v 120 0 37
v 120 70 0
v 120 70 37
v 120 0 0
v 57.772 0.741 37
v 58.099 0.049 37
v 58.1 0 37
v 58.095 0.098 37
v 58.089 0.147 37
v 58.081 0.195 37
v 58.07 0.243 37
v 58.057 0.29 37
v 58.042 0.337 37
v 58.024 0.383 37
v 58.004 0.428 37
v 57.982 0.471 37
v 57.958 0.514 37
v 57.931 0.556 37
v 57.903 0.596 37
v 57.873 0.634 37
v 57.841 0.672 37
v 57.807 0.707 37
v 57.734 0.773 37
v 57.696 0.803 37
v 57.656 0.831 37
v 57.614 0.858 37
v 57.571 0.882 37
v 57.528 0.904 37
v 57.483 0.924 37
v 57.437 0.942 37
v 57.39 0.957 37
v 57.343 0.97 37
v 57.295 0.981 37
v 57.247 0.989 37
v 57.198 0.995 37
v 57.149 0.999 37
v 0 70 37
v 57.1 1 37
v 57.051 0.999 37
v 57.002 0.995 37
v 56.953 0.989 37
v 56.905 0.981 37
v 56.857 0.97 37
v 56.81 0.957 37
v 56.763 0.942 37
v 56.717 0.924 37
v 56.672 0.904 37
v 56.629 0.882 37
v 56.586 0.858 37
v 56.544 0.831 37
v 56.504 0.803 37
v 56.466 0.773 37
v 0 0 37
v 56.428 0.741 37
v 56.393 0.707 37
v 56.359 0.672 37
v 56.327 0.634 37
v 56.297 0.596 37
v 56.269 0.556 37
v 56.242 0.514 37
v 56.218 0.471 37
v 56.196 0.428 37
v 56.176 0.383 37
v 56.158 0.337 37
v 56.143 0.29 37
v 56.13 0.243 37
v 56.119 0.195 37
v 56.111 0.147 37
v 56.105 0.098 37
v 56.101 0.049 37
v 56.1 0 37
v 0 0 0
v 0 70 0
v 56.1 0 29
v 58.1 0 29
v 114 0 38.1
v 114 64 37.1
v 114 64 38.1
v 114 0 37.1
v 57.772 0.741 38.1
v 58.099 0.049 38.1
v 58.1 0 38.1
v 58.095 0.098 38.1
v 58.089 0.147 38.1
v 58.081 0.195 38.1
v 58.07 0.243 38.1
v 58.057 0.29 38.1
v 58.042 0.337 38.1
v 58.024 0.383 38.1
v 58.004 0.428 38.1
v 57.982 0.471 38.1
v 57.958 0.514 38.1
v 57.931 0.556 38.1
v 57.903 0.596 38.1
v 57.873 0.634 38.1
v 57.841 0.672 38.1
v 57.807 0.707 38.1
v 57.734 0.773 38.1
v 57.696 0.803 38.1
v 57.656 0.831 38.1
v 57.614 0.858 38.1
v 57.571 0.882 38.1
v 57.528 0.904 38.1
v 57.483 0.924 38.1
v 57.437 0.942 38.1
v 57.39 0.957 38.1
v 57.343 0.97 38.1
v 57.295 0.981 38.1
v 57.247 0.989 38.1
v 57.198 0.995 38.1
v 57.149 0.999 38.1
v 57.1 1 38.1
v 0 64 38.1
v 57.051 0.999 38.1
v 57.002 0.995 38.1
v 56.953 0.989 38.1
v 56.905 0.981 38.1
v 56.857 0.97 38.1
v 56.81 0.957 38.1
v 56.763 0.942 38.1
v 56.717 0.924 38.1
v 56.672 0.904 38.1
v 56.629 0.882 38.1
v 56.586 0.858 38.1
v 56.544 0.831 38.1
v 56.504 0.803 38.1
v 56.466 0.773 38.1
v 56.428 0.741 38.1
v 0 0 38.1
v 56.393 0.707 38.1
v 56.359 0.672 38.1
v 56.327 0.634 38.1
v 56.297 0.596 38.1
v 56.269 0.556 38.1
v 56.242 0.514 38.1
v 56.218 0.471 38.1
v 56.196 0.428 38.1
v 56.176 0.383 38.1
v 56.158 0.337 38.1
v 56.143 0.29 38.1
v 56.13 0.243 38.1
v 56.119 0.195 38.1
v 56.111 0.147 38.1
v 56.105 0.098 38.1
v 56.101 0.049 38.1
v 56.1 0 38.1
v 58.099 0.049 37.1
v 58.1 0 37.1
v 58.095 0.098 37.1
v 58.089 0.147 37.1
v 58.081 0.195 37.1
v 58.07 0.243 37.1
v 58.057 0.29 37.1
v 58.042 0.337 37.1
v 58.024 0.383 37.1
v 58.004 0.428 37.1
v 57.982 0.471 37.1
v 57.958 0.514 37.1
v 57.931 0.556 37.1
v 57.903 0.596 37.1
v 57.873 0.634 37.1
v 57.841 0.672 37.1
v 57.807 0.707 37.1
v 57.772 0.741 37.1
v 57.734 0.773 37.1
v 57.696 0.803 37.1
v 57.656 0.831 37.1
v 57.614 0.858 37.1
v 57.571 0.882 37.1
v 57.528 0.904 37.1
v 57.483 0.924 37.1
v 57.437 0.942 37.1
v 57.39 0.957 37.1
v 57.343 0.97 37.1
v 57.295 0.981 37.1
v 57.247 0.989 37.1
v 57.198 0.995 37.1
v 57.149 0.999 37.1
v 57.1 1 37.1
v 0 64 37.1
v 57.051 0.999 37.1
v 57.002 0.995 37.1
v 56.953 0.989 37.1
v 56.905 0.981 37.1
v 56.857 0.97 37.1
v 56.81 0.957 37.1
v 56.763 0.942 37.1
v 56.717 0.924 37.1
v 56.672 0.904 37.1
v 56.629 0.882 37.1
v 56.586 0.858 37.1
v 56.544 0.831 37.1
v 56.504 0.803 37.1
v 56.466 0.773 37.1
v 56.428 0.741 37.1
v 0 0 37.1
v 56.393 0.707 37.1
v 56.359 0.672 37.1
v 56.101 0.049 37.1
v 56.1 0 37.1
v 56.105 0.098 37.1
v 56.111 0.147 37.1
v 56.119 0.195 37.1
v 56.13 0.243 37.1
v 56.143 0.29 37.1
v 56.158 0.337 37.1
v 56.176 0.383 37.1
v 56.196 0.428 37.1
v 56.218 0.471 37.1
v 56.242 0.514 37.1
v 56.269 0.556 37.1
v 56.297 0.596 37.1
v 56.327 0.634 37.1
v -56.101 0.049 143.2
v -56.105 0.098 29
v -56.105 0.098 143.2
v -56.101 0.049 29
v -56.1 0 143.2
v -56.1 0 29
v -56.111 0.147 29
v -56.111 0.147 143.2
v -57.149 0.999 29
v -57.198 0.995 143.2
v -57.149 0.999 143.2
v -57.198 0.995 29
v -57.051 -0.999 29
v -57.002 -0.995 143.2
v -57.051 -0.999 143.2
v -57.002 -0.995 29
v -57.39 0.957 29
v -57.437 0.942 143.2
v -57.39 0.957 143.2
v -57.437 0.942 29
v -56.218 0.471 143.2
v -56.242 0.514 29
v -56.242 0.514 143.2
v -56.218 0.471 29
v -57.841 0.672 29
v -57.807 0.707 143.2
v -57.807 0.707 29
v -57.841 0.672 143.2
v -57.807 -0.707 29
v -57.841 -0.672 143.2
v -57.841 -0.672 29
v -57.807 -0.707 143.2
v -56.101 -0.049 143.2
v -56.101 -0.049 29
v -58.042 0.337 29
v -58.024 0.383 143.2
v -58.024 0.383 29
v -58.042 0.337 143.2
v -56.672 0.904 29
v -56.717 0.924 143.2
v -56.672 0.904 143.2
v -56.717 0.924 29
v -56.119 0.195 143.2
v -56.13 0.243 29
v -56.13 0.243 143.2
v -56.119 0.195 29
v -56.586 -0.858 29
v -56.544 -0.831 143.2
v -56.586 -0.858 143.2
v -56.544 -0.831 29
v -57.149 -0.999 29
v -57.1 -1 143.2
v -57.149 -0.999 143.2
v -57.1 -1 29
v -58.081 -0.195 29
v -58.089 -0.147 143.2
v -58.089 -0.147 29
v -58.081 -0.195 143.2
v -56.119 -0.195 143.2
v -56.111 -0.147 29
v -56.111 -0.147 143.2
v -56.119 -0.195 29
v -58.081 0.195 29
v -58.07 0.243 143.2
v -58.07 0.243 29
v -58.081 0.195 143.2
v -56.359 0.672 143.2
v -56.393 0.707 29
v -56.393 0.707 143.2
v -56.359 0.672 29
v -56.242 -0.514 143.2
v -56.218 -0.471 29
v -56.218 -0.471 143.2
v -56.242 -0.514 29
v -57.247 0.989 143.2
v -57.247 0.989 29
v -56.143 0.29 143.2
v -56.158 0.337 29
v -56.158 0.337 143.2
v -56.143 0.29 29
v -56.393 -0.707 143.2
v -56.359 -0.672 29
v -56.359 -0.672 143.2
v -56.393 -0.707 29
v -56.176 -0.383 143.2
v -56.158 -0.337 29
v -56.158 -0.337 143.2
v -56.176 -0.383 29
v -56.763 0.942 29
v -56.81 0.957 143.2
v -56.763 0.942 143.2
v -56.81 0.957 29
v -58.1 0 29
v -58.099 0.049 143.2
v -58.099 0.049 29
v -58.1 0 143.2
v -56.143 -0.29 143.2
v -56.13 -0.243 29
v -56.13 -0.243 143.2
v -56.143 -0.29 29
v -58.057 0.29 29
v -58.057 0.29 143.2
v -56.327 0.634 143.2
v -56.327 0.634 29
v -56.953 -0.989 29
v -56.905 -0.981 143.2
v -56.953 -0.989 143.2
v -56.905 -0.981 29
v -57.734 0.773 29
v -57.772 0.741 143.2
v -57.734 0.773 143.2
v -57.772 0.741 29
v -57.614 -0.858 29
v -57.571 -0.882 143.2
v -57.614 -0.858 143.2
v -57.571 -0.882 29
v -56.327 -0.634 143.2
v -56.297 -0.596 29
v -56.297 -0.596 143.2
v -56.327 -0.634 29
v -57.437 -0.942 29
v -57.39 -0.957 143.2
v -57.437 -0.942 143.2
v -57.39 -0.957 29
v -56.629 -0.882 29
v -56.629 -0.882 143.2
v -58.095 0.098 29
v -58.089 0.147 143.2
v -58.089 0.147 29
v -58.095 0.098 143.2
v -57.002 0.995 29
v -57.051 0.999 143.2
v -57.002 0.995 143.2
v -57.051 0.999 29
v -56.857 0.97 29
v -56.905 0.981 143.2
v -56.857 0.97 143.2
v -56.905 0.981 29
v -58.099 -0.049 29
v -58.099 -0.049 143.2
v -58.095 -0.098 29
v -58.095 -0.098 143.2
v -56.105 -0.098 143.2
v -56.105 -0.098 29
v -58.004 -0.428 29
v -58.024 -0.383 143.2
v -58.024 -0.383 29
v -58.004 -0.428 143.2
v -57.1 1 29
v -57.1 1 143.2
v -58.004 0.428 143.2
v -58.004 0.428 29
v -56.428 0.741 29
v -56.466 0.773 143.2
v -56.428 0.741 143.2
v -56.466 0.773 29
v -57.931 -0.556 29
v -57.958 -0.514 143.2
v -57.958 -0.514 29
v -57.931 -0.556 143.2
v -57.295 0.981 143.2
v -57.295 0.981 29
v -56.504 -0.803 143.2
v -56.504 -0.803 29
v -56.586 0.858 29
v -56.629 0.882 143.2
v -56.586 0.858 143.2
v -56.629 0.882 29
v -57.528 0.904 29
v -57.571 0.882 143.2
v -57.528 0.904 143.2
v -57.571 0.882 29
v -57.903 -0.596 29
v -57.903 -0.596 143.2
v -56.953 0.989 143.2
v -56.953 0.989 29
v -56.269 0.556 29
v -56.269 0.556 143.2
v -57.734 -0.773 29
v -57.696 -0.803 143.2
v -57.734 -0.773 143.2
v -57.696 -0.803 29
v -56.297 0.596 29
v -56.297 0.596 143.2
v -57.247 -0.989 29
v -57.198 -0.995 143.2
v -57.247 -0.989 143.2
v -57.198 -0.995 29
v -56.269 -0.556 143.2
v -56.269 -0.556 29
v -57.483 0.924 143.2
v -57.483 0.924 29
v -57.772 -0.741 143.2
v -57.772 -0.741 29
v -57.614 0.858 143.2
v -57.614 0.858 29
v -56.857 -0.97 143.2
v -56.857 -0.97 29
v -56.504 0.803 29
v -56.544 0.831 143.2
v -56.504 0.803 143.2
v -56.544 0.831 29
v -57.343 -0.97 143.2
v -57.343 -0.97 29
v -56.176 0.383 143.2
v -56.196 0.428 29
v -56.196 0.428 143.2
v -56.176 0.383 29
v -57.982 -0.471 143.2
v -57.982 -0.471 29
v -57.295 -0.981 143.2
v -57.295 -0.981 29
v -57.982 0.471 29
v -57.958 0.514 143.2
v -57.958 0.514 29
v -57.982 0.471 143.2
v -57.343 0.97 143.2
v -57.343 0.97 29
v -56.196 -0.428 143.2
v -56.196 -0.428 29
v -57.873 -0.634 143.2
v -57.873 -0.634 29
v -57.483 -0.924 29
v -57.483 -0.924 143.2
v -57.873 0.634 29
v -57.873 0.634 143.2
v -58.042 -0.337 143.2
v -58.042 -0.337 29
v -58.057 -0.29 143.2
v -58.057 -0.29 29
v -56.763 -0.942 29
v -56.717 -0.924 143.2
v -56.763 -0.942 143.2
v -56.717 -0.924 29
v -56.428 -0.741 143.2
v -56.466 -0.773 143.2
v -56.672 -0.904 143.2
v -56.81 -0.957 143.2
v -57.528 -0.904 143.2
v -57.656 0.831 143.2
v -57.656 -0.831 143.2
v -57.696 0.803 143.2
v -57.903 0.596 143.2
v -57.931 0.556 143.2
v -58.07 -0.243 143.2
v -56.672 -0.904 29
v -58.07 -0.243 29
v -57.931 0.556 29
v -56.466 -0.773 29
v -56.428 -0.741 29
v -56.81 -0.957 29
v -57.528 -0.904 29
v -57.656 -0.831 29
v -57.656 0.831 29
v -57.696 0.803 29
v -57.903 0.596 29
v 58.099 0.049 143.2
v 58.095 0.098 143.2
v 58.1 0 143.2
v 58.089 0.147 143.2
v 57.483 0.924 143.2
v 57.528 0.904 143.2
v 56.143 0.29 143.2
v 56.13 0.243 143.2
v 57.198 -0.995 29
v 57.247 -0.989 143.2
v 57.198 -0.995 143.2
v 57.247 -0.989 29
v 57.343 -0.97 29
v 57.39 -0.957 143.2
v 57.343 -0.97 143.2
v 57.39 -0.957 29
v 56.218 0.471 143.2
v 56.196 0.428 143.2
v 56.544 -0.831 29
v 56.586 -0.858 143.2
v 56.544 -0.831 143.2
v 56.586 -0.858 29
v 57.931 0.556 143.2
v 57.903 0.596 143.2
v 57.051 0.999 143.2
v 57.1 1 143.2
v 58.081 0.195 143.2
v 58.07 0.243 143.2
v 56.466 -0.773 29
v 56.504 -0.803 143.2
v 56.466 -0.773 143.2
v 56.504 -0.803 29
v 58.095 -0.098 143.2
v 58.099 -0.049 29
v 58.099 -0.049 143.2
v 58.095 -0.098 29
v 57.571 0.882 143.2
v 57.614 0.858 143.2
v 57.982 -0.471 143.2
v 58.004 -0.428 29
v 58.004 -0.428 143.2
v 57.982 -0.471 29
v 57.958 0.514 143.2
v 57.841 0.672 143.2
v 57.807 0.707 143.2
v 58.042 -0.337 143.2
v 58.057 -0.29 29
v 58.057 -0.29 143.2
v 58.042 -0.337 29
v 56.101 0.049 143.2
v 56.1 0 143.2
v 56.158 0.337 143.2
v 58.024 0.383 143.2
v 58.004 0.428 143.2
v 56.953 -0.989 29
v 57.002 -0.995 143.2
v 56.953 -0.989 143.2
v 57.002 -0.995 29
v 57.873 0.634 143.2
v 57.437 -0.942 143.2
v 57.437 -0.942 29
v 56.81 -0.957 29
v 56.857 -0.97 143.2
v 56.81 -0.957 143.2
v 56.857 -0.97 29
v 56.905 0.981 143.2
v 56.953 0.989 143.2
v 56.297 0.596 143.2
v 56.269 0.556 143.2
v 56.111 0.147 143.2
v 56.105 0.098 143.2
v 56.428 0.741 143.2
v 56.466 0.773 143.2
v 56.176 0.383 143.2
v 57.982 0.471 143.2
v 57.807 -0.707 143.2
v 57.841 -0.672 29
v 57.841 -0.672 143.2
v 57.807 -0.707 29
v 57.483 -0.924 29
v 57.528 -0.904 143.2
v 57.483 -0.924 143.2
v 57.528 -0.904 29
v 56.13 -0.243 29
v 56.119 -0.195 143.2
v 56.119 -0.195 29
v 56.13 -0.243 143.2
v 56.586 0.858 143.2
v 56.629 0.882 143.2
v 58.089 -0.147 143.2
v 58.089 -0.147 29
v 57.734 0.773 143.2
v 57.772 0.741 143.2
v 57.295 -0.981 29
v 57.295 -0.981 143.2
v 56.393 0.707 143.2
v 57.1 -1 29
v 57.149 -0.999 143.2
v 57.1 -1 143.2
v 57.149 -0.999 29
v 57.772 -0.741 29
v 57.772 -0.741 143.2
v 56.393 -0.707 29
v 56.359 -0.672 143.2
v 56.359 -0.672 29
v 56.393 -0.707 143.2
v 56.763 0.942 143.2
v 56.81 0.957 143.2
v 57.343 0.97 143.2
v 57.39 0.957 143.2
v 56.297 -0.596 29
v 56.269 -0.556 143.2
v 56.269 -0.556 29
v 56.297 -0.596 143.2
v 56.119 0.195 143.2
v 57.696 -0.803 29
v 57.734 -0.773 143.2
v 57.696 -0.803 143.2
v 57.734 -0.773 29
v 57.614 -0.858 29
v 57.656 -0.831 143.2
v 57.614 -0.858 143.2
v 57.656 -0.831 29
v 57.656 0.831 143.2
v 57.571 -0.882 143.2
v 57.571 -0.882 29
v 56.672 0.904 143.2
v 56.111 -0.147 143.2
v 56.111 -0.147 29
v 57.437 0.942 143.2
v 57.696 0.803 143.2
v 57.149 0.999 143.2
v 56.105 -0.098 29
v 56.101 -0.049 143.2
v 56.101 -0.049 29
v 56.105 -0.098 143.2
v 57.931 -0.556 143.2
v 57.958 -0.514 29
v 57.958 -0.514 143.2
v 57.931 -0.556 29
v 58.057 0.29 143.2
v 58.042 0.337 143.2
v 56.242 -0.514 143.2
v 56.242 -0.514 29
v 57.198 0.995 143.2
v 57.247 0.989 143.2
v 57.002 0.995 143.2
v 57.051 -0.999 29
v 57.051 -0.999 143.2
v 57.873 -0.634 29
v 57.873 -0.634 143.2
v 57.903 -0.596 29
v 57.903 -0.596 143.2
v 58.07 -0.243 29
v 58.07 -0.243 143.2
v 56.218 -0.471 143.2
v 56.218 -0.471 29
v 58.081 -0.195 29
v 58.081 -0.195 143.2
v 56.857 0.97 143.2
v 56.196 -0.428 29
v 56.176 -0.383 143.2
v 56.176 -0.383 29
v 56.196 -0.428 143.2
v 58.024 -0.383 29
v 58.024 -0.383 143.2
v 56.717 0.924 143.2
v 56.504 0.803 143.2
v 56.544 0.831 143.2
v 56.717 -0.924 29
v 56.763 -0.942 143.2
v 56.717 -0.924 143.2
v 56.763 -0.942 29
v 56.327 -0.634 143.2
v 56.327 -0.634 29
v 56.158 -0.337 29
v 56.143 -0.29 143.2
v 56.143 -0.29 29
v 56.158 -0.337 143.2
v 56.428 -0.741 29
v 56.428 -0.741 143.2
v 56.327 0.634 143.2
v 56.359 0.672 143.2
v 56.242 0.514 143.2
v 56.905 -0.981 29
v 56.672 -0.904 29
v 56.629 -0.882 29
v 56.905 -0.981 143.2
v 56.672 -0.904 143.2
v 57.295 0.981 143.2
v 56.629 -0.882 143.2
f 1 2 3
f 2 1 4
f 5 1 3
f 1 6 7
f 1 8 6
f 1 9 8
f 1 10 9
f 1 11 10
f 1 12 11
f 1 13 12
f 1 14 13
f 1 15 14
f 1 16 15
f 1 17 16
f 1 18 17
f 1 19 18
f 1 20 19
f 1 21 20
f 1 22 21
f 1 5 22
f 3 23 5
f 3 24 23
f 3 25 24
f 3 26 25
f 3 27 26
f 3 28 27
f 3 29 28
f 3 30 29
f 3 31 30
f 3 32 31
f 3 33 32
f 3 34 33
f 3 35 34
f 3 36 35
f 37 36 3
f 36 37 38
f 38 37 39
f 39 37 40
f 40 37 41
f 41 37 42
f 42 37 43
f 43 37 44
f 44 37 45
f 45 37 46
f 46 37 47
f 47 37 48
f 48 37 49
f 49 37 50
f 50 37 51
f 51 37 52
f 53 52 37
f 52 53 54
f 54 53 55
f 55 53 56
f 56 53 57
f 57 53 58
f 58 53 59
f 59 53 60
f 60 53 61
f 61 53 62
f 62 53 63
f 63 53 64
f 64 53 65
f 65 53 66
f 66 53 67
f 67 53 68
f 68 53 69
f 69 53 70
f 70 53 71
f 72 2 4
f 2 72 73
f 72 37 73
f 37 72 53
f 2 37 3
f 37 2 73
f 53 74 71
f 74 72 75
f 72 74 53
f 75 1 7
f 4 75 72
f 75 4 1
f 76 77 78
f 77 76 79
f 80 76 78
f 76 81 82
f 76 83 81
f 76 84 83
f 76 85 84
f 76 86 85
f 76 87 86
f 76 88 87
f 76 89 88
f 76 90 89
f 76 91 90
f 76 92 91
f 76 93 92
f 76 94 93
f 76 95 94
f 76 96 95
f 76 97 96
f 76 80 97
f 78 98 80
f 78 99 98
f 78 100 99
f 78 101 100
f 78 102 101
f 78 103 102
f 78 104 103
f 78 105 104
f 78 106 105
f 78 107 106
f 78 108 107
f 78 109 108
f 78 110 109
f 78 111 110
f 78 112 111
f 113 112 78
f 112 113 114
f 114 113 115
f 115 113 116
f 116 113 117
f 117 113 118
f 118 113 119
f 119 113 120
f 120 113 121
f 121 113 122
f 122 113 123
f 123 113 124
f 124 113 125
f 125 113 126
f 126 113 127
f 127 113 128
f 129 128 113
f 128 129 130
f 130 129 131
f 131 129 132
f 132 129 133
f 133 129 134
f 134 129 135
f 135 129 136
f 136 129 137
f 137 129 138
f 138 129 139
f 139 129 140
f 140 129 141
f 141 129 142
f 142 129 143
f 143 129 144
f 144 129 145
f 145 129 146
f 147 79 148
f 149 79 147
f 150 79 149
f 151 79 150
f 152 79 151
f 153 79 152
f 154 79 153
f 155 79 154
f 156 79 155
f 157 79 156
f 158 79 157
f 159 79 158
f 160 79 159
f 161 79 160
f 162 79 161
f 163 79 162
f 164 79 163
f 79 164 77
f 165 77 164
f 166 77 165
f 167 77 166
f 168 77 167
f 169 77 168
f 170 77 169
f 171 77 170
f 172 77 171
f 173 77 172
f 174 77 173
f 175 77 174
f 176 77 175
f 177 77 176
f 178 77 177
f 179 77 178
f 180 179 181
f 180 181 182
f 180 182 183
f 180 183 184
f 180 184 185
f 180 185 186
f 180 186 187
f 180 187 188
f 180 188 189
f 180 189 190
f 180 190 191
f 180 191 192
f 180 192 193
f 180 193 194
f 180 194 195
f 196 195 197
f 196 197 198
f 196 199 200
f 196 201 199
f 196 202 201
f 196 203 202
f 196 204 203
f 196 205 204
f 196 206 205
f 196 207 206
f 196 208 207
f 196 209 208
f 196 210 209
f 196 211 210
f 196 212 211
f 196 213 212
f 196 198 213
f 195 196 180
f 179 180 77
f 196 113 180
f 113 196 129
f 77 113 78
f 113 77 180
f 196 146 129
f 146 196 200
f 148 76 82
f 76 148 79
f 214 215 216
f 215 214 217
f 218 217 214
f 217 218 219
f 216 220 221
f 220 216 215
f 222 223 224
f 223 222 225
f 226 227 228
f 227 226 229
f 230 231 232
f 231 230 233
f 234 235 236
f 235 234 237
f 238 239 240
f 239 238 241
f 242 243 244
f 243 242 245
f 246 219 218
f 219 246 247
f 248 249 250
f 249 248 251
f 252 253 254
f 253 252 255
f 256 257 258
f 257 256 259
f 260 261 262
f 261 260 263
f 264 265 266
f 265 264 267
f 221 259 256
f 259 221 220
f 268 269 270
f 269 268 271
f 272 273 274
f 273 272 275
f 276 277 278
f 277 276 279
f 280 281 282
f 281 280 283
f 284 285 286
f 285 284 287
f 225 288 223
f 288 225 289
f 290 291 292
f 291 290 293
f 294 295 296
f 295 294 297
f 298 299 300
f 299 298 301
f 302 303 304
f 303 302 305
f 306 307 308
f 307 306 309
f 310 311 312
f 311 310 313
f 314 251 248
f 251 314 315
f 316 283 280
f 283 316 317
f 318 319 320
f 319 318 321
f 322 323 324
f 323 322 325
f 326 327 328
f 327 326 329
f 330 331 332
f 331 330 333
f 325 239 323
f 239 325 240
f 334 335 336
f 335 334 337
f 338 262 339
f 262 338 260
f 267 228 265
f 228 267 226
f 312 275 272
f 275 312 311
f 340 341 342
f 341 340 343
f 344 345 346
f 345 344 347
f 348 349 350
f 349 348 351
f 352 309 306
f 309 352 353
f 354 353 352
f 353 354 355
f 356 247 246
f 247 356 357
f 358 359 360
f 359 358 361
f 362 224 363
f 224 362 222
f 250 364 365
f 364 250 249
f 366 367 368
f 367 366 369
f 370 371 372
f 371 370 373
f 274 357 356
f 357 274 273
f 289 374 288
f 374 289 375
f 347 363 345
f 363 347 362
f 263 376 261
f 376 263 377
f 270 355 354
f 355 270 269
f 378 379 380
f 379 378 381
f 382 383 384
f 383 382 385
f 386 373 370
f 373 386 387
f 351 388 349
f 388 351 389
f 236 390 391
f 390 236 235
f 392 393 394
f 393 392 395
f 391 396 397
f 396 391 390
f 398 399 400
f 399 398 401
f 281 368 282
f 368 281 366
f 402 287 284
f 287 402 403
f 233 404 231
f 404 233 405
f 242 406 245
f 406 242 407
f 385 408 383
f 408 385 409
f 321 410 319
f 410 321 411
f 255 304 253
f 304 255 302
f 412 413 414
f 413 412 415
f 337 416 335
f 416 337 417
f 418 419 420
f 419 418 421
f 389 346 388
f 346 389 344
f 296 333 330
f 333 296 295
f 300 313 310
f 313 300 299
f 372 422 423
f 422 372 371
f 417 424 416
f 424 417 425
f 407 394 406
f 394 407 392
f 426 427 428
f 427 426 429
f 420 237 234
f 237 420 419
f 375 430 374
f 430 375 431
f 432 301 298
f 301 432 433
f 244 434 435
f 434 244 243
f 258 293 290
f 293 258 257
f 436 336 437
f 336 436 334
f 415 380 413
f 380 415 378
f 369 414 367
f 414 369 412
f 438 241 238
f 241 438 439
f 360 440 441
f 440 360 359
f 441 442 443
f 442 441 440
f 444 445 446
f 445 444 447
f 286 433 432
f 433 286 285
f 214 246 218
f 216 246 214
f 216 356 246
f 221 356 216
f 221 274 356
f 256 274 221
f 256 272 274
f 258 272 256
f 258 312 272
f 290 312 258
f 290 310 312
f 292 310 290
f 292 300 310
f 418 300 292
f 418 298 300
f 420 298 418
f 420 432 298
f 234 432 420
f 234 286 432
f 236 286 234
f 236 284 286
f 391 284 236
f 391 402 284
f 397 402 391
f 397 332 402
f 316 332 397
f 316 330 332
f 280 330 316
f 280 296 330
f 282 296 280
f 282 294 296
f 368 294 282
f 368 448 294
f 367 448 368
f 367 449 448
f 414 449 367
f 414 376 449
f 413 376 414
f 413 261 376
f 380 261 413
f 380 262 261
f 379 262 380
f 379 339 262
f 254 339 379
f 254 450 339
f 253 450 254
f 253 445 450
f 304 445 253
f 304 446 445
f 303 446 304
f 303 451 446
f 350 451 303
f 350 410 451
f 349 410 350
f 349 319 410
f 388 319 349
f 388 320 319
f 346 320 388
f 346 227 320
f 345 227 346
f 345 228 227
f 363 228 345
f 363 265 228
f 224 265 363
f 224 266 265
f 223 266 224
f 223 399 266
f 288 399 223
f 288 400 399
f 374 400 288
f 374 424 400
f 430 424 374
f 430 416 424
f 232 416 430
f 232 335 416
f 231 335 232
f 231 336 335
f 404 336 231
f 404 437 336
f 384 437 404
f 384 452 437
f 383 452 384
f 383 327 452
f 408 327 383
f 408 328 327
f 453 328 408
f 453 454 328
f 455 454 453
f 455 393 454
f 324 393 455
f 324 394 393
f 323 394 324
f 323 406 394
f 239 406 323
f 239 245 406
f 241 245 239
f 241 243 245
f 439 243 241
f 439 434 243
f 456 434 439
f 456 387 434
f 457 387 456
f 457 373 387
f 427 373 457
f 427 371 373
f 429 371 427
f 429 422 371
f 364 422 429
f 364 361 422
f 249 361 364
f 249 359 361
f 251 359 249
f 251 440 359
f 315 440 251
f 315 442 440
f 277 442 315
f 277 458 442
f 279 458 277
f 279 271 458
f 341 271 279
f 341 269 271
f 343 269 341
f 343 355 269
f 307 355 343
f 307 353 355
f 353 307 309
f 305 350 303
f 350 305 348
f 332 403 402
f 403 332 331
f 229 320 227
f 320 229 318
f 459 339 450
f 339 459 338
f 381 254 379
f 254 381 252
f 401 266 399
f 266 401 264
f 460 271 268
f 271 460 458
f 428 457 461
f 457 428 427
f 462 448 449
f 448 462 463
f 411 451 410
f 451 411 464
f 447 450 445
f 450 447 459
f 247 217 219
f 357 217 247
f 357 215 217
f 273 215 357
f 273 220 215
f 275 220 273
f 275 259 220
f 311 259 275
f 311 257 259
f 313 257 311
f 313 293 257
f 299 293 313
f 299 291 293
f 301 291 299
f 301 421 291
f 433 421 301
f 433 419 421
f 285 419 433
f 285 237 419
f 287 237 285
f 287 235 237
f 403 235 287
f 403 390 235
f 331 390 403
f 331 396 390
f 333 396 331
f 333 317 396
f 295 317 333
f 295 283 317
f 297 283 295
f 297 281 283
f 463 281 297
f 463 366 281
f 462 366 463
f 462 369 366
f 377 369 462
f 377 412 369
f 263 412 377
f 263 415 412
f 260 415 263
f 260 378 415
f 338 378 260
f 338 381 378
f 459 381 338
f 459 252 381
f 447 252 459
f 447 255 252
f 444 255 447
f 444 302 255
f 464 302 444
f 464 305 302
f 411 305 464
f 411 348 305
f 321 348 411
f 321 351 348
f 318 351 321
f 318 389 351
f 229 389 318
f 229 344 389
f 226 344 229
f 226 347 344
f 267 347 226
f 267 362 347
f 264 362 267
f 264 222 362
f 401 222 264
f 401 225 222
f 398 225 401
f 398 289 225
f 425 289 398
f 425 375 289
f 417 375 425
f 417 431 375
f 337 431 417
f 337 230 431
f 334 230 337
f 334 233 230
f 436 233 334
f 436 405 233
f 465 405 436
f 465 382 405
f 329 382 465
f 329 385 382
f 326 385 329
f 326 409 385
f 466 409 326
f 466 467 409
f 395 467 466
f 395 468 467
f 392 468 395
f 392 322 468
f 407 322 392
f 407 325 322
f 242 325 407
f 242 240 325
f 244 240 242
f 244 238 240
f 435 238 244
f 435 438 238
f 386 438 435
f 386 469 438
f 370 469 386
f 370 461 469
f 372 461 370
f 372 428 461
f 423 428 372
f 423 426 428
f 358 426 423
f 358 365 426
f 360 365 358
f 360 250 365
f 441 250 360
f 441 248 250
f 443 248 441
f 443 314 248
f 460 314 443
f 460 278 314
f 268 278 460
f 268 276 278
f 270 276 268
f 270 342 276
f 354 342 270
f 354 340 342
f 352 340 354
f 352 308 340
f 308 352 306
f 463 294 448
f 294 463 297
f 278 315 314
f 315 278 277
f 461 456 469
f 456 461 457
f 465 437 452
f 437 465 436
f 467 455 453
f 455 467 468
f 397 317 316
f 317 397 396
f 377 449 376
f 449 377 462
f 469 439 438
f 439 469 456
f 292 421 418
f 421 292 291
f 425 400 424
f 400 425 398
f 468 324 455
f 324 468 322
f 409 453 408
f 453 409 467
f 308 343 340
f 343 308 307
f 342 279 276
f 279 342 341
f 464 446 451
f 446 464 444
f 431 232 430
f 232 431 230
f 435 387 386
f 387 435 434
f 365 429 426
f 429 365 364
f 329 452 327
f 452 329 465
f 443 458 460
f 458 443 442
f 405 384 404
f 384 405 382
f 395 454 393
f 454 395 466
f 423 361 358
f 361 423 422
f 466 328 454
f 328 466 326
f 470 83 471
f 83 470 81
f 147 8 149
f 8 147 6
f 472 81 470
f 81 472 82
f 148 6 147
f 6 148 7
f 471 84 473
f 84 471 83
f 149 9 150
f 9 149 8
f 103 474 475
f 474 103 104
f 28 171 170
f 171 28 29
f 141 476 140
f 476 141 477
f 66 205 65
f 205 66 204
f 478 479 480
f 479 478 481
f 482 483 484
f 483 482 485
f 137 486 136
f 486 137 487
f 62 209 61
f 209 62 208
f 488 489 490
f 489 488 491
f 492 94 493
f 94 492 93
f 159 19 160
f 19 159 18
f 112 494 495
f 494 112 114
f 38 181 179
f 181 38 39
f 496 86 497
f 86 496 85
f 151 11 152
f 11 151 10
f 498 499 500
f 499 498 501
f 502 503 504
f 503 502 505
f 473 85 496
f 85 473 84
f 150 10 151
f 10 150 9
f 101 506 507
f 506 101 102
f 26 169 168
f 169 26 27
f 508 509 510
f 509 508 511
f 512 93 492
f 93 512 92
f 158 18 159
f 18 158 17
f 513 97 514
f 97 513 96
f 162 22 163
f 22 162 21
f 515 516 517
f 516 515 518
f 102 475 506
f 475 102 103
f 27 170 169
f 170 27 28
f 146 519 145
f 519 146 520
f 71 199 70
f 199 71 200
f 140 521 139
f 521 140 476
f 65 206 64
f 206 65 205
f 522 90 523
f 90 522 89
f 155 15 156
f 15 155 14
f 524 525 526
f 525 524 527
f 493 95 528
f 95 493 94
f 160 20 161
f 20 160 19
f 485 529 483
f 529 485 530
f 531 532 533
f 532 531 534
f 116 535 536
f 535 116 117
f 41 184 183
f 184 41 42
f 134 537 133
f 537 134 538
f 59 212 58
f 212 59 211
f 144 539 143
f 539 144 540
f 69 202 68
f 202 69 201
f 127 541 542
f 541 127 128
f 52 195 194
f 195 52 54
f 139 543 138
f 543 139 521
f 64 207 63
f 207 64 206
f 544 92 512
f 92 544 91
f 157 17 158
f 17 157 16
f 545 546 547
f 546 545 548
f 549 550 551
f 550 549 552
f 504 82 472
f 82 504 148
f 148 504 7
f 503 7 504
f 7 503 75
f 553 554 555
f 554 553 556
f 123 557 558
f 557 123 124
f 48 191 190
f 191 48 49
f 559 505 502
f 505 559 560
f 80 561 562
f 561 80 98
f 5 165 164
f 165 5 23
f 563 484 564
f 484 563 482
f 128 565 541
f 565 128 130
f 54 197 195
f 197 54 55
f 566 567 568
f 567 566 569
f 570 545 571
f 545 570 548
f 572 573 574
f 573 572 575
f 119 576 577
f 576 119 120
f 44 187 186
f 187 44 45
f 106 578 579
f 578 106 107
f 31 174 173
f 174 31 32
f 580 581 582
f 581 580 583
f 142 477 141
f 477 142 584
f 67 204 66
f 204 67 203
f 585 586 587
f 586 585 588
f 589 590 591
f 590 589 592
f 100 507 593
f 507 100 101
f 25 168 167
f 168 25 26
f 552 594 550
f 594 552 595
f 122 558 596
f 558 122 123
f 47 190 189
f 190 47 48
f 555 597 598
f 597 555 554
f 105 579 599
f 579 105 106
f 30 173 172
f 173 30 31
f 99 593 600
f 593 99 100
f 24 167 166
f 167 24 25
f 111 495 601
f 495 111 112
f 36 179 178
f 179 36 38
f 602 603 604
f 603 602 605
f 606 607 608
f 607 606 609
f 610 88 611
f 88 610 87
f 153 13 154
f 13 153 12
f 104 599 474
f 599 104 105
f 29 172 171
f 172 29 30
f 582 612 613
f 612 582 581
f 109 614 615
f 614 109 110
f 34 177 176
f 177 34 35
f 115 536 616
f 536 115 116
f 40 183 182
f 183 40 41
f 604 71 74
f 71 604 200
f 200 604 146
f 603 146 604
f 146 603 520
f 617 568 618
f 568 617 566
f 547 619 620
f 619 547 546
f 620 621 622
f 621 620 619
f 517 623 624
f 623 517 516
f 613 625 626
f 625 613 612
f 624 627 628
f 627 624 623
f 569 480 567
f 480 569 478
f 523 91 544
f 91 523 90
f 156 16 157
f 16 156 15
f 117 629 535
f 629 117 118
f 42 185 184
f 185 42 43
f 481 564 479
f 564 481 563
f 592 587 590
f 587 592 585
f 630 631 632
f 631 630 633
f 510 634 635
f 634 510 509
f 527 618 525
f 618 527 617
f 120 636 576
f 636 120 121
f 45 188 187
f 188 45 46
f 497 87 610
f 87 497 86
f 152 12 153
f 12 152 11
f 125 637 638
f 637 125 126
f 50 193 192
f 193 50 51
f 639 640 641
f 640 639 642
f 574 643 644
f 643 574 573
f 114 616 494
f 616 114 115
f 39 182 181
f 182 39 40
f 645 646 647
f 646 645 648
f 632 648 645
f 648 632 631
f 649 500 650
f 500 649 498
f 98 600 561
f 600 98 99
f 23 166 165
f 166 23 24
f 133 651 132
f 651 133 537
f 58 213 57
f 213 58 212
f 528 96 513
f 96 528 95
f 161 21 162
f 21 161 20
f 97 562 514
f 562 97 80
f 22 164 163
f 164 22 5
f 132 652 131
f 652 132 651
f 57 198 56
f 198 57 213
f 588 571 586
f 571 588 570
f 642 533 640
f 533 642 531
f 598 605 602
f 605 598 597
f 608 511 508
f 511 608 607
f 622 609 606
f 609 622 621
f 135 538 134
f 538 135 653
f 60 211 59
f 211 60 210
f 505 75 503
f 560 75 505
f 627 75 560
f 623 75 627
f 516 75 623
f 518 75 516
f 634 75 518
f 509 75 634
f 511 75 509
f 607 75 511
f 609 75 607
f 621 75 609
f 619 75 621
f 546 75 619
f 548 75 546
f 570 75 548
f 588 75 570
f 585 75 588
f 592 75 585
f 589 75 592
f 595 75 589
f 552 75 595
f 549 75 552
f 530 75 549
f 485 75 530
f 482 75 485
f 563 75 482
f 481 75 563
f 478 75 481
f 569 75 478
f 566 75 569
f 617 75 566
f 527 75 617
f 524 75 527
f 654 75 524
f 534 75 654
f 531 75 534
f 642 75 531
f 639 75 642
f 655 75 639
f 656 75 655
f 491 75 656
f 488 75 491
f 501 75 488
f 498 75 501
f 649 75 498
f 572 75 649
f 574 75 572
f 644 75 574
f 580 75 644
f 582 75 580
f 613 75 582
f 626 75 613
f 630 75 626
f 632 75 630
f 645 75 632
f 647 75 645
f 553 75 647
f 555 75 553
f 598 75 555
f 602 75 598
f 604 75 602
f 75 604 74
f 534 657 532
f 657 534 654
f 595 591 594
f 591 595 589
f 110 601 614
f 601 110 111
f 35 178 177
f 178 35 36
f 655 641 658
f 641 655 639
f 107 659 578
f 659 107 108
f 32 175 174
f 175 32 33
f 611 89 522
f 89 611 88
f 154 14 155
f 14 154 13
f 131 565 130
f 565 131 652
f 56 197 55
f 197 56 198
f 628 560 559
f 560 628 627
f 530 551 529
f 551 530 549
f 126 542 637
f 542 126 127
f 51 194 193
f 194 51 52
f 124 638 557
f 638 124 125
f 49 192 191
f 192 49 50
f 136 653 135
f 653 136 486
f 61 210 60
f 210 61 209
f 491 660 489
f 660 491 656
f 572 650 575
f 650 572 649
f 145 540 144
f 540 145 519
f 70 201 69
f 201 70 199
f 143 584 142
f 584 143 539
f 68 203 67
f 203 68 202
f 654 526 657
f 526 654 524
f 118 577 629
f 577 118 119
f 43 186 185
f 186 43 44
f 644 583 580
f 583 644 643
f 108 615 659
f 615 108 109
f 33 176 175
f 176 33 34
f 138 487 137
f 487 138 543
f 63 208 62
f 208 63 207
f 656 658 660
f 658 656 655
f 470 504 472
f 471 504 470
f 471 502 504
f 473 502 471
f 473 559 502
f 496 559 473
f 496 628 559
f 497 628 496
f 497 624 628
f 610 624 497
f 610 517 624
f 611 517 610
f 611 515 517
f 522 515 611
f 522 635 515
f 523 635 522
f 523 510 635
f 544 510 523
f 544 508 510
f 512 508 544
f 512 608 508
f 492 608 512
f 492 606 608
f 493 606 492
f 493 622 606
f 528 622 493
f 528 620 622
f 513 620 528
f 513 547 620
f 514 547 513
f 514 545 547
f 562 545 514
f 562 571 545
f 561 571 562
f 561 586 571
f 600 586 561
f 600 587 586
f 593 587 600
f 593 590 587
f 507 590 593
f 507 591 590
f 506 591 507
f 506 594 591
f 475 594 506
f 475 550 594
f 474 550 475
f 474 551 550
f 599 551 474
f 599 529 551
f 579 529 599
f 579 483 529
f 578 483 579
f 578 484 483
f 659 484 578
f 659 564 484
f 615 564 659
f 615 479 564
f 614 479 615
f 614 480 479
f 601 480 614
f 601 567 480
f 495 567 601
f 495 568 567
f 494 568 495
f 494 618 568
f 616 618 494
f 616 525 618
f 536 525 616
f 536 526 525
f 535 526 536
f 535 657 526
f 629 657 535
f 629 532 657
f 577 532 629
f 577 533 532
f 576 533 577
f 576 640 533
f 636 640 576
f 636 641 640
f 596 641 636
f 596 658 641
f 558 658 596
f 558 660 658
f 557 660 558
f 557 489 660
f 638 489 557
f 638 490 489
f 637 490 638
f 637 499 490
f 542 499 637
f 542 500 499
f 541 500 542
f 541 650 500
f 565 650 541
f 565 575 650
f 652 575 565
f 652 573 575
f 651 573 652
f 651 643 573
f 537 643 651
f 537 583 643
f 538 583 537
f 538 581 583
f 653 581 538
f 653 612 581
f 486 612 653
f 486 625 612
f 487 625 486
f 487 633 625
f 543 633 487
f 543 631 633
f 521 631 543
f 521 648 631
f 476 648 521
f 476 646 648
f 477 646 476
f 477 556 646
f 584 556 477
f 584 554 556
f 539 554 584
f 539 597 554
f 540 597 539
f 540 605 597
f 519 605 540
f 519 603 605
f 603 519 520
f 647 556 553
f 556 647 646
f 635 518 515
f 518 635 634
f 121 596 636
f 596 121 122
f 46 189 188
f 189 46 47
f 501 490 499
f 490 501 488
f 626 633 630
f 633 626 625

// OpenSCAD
// Buffer Tank for Mini Horizontal Gel Electrophoresis
// Units: millimetres

// Outer Dimensions
$w_outer = 120; // X width
$d_outer = 70;  // Y depth
$h_outer = 40;  // Z height

// Wall and Floor Thickness
$w_thick = 3;   // Wall thickness
$f_thick = 3;   // Floor thickness

// Platform Dimensions
$p_len = 60;    // Platform length (X)
$p_width = $d_outer - 2*$w_thick; // Platform width (Y) - spans full inner width
$p_height = 10; // Platform height above inner floor
$p_z_base = $f_thick + $p_height; // Z position of platform top

// Electrode Hole Dimensions
$h_dia = 2;     // Hole diameter
$h_y = 0;       // Hole Y position
$h_z = 30;      // Hole Z position

// Configuration
$fn = 128;      // Resolution for curved shapes

// Derived Dimensions
$w_inner = $w_outer - 2*$w_thick;
$d_inner = $d_outer - 2*$w_thick;
$h_inner = $h_outer - $f_thick;

module buffer_tank() {
    // 1. Main Tank Body (Open Top)
    // We build the solid block and then subtract the top opening.
    // To ensure clean cuts, we extend the cut slightly.
    
    // Base block
    translate([0, 0, 0])
        cube([
            $w_outer, 
            $d_outer, 
            $h_outer - $w_thick // Top wall is open, so height is floor + side walls
        ]);
    
    // Cut out the top opening (Open Top)
    // The opening is the inner dimensions. We extend Z slightly to ensure clean cut.
    translate([0, 0, $h_outer - $w_thick + 0.1])
        cube([
            $w_inner, 
            $d_inner, 
            1 // Just a thin slice to define the plane
        ]);
    
    // 2. Central Raised Platform
    // Position: Centred in X, spans full inner Y, sits on inner floor.
    // Inner floor Z = $f_thick.
    // Platform top Z = $f_thick + $p_height = $p_z_base.
    
    translate([
        ($w_outer - $p_len) / 2, // Centre in X
        0,                        // Centre in Y (spans full width)
        $f_thick                  // Sit on inner floor
    ])
        cube([
            $p_len, 
            $p_width, 
            $p_height
        ]);
    
    // 3. Electrode Holes
    // Two holes: one at each end (X = +/- $w_inner/2), 
    // along X axis, at Y = 0, Z = $h_z.
    
    $hole_z_start = $h_z - $h_dia/2;
    $hole_z_end = $h_z + $h_dia/2;
    
    // Left Hole
    translate([
        -$w_inner/2 - 0.1, // Extend past face
        $h_y, 
        $hole_z_start
    ])
        cylinder(
            h = $w_inner + 0.2, // Extend through tank
            r = $h_dia/2,
            $fn = $fn
        );
    
    // Right Hole
    translate([
        $w_inner/2 + 0.1, // Extend past face
        $h_y, 
        $hole_z_start
    ])
        cylinder(
            h = $w_inner + 0.2, // Extend through tank
            r = $h_dia/2,
            $fn = $fn
        );
}

// Render the part
buffer_tank();
